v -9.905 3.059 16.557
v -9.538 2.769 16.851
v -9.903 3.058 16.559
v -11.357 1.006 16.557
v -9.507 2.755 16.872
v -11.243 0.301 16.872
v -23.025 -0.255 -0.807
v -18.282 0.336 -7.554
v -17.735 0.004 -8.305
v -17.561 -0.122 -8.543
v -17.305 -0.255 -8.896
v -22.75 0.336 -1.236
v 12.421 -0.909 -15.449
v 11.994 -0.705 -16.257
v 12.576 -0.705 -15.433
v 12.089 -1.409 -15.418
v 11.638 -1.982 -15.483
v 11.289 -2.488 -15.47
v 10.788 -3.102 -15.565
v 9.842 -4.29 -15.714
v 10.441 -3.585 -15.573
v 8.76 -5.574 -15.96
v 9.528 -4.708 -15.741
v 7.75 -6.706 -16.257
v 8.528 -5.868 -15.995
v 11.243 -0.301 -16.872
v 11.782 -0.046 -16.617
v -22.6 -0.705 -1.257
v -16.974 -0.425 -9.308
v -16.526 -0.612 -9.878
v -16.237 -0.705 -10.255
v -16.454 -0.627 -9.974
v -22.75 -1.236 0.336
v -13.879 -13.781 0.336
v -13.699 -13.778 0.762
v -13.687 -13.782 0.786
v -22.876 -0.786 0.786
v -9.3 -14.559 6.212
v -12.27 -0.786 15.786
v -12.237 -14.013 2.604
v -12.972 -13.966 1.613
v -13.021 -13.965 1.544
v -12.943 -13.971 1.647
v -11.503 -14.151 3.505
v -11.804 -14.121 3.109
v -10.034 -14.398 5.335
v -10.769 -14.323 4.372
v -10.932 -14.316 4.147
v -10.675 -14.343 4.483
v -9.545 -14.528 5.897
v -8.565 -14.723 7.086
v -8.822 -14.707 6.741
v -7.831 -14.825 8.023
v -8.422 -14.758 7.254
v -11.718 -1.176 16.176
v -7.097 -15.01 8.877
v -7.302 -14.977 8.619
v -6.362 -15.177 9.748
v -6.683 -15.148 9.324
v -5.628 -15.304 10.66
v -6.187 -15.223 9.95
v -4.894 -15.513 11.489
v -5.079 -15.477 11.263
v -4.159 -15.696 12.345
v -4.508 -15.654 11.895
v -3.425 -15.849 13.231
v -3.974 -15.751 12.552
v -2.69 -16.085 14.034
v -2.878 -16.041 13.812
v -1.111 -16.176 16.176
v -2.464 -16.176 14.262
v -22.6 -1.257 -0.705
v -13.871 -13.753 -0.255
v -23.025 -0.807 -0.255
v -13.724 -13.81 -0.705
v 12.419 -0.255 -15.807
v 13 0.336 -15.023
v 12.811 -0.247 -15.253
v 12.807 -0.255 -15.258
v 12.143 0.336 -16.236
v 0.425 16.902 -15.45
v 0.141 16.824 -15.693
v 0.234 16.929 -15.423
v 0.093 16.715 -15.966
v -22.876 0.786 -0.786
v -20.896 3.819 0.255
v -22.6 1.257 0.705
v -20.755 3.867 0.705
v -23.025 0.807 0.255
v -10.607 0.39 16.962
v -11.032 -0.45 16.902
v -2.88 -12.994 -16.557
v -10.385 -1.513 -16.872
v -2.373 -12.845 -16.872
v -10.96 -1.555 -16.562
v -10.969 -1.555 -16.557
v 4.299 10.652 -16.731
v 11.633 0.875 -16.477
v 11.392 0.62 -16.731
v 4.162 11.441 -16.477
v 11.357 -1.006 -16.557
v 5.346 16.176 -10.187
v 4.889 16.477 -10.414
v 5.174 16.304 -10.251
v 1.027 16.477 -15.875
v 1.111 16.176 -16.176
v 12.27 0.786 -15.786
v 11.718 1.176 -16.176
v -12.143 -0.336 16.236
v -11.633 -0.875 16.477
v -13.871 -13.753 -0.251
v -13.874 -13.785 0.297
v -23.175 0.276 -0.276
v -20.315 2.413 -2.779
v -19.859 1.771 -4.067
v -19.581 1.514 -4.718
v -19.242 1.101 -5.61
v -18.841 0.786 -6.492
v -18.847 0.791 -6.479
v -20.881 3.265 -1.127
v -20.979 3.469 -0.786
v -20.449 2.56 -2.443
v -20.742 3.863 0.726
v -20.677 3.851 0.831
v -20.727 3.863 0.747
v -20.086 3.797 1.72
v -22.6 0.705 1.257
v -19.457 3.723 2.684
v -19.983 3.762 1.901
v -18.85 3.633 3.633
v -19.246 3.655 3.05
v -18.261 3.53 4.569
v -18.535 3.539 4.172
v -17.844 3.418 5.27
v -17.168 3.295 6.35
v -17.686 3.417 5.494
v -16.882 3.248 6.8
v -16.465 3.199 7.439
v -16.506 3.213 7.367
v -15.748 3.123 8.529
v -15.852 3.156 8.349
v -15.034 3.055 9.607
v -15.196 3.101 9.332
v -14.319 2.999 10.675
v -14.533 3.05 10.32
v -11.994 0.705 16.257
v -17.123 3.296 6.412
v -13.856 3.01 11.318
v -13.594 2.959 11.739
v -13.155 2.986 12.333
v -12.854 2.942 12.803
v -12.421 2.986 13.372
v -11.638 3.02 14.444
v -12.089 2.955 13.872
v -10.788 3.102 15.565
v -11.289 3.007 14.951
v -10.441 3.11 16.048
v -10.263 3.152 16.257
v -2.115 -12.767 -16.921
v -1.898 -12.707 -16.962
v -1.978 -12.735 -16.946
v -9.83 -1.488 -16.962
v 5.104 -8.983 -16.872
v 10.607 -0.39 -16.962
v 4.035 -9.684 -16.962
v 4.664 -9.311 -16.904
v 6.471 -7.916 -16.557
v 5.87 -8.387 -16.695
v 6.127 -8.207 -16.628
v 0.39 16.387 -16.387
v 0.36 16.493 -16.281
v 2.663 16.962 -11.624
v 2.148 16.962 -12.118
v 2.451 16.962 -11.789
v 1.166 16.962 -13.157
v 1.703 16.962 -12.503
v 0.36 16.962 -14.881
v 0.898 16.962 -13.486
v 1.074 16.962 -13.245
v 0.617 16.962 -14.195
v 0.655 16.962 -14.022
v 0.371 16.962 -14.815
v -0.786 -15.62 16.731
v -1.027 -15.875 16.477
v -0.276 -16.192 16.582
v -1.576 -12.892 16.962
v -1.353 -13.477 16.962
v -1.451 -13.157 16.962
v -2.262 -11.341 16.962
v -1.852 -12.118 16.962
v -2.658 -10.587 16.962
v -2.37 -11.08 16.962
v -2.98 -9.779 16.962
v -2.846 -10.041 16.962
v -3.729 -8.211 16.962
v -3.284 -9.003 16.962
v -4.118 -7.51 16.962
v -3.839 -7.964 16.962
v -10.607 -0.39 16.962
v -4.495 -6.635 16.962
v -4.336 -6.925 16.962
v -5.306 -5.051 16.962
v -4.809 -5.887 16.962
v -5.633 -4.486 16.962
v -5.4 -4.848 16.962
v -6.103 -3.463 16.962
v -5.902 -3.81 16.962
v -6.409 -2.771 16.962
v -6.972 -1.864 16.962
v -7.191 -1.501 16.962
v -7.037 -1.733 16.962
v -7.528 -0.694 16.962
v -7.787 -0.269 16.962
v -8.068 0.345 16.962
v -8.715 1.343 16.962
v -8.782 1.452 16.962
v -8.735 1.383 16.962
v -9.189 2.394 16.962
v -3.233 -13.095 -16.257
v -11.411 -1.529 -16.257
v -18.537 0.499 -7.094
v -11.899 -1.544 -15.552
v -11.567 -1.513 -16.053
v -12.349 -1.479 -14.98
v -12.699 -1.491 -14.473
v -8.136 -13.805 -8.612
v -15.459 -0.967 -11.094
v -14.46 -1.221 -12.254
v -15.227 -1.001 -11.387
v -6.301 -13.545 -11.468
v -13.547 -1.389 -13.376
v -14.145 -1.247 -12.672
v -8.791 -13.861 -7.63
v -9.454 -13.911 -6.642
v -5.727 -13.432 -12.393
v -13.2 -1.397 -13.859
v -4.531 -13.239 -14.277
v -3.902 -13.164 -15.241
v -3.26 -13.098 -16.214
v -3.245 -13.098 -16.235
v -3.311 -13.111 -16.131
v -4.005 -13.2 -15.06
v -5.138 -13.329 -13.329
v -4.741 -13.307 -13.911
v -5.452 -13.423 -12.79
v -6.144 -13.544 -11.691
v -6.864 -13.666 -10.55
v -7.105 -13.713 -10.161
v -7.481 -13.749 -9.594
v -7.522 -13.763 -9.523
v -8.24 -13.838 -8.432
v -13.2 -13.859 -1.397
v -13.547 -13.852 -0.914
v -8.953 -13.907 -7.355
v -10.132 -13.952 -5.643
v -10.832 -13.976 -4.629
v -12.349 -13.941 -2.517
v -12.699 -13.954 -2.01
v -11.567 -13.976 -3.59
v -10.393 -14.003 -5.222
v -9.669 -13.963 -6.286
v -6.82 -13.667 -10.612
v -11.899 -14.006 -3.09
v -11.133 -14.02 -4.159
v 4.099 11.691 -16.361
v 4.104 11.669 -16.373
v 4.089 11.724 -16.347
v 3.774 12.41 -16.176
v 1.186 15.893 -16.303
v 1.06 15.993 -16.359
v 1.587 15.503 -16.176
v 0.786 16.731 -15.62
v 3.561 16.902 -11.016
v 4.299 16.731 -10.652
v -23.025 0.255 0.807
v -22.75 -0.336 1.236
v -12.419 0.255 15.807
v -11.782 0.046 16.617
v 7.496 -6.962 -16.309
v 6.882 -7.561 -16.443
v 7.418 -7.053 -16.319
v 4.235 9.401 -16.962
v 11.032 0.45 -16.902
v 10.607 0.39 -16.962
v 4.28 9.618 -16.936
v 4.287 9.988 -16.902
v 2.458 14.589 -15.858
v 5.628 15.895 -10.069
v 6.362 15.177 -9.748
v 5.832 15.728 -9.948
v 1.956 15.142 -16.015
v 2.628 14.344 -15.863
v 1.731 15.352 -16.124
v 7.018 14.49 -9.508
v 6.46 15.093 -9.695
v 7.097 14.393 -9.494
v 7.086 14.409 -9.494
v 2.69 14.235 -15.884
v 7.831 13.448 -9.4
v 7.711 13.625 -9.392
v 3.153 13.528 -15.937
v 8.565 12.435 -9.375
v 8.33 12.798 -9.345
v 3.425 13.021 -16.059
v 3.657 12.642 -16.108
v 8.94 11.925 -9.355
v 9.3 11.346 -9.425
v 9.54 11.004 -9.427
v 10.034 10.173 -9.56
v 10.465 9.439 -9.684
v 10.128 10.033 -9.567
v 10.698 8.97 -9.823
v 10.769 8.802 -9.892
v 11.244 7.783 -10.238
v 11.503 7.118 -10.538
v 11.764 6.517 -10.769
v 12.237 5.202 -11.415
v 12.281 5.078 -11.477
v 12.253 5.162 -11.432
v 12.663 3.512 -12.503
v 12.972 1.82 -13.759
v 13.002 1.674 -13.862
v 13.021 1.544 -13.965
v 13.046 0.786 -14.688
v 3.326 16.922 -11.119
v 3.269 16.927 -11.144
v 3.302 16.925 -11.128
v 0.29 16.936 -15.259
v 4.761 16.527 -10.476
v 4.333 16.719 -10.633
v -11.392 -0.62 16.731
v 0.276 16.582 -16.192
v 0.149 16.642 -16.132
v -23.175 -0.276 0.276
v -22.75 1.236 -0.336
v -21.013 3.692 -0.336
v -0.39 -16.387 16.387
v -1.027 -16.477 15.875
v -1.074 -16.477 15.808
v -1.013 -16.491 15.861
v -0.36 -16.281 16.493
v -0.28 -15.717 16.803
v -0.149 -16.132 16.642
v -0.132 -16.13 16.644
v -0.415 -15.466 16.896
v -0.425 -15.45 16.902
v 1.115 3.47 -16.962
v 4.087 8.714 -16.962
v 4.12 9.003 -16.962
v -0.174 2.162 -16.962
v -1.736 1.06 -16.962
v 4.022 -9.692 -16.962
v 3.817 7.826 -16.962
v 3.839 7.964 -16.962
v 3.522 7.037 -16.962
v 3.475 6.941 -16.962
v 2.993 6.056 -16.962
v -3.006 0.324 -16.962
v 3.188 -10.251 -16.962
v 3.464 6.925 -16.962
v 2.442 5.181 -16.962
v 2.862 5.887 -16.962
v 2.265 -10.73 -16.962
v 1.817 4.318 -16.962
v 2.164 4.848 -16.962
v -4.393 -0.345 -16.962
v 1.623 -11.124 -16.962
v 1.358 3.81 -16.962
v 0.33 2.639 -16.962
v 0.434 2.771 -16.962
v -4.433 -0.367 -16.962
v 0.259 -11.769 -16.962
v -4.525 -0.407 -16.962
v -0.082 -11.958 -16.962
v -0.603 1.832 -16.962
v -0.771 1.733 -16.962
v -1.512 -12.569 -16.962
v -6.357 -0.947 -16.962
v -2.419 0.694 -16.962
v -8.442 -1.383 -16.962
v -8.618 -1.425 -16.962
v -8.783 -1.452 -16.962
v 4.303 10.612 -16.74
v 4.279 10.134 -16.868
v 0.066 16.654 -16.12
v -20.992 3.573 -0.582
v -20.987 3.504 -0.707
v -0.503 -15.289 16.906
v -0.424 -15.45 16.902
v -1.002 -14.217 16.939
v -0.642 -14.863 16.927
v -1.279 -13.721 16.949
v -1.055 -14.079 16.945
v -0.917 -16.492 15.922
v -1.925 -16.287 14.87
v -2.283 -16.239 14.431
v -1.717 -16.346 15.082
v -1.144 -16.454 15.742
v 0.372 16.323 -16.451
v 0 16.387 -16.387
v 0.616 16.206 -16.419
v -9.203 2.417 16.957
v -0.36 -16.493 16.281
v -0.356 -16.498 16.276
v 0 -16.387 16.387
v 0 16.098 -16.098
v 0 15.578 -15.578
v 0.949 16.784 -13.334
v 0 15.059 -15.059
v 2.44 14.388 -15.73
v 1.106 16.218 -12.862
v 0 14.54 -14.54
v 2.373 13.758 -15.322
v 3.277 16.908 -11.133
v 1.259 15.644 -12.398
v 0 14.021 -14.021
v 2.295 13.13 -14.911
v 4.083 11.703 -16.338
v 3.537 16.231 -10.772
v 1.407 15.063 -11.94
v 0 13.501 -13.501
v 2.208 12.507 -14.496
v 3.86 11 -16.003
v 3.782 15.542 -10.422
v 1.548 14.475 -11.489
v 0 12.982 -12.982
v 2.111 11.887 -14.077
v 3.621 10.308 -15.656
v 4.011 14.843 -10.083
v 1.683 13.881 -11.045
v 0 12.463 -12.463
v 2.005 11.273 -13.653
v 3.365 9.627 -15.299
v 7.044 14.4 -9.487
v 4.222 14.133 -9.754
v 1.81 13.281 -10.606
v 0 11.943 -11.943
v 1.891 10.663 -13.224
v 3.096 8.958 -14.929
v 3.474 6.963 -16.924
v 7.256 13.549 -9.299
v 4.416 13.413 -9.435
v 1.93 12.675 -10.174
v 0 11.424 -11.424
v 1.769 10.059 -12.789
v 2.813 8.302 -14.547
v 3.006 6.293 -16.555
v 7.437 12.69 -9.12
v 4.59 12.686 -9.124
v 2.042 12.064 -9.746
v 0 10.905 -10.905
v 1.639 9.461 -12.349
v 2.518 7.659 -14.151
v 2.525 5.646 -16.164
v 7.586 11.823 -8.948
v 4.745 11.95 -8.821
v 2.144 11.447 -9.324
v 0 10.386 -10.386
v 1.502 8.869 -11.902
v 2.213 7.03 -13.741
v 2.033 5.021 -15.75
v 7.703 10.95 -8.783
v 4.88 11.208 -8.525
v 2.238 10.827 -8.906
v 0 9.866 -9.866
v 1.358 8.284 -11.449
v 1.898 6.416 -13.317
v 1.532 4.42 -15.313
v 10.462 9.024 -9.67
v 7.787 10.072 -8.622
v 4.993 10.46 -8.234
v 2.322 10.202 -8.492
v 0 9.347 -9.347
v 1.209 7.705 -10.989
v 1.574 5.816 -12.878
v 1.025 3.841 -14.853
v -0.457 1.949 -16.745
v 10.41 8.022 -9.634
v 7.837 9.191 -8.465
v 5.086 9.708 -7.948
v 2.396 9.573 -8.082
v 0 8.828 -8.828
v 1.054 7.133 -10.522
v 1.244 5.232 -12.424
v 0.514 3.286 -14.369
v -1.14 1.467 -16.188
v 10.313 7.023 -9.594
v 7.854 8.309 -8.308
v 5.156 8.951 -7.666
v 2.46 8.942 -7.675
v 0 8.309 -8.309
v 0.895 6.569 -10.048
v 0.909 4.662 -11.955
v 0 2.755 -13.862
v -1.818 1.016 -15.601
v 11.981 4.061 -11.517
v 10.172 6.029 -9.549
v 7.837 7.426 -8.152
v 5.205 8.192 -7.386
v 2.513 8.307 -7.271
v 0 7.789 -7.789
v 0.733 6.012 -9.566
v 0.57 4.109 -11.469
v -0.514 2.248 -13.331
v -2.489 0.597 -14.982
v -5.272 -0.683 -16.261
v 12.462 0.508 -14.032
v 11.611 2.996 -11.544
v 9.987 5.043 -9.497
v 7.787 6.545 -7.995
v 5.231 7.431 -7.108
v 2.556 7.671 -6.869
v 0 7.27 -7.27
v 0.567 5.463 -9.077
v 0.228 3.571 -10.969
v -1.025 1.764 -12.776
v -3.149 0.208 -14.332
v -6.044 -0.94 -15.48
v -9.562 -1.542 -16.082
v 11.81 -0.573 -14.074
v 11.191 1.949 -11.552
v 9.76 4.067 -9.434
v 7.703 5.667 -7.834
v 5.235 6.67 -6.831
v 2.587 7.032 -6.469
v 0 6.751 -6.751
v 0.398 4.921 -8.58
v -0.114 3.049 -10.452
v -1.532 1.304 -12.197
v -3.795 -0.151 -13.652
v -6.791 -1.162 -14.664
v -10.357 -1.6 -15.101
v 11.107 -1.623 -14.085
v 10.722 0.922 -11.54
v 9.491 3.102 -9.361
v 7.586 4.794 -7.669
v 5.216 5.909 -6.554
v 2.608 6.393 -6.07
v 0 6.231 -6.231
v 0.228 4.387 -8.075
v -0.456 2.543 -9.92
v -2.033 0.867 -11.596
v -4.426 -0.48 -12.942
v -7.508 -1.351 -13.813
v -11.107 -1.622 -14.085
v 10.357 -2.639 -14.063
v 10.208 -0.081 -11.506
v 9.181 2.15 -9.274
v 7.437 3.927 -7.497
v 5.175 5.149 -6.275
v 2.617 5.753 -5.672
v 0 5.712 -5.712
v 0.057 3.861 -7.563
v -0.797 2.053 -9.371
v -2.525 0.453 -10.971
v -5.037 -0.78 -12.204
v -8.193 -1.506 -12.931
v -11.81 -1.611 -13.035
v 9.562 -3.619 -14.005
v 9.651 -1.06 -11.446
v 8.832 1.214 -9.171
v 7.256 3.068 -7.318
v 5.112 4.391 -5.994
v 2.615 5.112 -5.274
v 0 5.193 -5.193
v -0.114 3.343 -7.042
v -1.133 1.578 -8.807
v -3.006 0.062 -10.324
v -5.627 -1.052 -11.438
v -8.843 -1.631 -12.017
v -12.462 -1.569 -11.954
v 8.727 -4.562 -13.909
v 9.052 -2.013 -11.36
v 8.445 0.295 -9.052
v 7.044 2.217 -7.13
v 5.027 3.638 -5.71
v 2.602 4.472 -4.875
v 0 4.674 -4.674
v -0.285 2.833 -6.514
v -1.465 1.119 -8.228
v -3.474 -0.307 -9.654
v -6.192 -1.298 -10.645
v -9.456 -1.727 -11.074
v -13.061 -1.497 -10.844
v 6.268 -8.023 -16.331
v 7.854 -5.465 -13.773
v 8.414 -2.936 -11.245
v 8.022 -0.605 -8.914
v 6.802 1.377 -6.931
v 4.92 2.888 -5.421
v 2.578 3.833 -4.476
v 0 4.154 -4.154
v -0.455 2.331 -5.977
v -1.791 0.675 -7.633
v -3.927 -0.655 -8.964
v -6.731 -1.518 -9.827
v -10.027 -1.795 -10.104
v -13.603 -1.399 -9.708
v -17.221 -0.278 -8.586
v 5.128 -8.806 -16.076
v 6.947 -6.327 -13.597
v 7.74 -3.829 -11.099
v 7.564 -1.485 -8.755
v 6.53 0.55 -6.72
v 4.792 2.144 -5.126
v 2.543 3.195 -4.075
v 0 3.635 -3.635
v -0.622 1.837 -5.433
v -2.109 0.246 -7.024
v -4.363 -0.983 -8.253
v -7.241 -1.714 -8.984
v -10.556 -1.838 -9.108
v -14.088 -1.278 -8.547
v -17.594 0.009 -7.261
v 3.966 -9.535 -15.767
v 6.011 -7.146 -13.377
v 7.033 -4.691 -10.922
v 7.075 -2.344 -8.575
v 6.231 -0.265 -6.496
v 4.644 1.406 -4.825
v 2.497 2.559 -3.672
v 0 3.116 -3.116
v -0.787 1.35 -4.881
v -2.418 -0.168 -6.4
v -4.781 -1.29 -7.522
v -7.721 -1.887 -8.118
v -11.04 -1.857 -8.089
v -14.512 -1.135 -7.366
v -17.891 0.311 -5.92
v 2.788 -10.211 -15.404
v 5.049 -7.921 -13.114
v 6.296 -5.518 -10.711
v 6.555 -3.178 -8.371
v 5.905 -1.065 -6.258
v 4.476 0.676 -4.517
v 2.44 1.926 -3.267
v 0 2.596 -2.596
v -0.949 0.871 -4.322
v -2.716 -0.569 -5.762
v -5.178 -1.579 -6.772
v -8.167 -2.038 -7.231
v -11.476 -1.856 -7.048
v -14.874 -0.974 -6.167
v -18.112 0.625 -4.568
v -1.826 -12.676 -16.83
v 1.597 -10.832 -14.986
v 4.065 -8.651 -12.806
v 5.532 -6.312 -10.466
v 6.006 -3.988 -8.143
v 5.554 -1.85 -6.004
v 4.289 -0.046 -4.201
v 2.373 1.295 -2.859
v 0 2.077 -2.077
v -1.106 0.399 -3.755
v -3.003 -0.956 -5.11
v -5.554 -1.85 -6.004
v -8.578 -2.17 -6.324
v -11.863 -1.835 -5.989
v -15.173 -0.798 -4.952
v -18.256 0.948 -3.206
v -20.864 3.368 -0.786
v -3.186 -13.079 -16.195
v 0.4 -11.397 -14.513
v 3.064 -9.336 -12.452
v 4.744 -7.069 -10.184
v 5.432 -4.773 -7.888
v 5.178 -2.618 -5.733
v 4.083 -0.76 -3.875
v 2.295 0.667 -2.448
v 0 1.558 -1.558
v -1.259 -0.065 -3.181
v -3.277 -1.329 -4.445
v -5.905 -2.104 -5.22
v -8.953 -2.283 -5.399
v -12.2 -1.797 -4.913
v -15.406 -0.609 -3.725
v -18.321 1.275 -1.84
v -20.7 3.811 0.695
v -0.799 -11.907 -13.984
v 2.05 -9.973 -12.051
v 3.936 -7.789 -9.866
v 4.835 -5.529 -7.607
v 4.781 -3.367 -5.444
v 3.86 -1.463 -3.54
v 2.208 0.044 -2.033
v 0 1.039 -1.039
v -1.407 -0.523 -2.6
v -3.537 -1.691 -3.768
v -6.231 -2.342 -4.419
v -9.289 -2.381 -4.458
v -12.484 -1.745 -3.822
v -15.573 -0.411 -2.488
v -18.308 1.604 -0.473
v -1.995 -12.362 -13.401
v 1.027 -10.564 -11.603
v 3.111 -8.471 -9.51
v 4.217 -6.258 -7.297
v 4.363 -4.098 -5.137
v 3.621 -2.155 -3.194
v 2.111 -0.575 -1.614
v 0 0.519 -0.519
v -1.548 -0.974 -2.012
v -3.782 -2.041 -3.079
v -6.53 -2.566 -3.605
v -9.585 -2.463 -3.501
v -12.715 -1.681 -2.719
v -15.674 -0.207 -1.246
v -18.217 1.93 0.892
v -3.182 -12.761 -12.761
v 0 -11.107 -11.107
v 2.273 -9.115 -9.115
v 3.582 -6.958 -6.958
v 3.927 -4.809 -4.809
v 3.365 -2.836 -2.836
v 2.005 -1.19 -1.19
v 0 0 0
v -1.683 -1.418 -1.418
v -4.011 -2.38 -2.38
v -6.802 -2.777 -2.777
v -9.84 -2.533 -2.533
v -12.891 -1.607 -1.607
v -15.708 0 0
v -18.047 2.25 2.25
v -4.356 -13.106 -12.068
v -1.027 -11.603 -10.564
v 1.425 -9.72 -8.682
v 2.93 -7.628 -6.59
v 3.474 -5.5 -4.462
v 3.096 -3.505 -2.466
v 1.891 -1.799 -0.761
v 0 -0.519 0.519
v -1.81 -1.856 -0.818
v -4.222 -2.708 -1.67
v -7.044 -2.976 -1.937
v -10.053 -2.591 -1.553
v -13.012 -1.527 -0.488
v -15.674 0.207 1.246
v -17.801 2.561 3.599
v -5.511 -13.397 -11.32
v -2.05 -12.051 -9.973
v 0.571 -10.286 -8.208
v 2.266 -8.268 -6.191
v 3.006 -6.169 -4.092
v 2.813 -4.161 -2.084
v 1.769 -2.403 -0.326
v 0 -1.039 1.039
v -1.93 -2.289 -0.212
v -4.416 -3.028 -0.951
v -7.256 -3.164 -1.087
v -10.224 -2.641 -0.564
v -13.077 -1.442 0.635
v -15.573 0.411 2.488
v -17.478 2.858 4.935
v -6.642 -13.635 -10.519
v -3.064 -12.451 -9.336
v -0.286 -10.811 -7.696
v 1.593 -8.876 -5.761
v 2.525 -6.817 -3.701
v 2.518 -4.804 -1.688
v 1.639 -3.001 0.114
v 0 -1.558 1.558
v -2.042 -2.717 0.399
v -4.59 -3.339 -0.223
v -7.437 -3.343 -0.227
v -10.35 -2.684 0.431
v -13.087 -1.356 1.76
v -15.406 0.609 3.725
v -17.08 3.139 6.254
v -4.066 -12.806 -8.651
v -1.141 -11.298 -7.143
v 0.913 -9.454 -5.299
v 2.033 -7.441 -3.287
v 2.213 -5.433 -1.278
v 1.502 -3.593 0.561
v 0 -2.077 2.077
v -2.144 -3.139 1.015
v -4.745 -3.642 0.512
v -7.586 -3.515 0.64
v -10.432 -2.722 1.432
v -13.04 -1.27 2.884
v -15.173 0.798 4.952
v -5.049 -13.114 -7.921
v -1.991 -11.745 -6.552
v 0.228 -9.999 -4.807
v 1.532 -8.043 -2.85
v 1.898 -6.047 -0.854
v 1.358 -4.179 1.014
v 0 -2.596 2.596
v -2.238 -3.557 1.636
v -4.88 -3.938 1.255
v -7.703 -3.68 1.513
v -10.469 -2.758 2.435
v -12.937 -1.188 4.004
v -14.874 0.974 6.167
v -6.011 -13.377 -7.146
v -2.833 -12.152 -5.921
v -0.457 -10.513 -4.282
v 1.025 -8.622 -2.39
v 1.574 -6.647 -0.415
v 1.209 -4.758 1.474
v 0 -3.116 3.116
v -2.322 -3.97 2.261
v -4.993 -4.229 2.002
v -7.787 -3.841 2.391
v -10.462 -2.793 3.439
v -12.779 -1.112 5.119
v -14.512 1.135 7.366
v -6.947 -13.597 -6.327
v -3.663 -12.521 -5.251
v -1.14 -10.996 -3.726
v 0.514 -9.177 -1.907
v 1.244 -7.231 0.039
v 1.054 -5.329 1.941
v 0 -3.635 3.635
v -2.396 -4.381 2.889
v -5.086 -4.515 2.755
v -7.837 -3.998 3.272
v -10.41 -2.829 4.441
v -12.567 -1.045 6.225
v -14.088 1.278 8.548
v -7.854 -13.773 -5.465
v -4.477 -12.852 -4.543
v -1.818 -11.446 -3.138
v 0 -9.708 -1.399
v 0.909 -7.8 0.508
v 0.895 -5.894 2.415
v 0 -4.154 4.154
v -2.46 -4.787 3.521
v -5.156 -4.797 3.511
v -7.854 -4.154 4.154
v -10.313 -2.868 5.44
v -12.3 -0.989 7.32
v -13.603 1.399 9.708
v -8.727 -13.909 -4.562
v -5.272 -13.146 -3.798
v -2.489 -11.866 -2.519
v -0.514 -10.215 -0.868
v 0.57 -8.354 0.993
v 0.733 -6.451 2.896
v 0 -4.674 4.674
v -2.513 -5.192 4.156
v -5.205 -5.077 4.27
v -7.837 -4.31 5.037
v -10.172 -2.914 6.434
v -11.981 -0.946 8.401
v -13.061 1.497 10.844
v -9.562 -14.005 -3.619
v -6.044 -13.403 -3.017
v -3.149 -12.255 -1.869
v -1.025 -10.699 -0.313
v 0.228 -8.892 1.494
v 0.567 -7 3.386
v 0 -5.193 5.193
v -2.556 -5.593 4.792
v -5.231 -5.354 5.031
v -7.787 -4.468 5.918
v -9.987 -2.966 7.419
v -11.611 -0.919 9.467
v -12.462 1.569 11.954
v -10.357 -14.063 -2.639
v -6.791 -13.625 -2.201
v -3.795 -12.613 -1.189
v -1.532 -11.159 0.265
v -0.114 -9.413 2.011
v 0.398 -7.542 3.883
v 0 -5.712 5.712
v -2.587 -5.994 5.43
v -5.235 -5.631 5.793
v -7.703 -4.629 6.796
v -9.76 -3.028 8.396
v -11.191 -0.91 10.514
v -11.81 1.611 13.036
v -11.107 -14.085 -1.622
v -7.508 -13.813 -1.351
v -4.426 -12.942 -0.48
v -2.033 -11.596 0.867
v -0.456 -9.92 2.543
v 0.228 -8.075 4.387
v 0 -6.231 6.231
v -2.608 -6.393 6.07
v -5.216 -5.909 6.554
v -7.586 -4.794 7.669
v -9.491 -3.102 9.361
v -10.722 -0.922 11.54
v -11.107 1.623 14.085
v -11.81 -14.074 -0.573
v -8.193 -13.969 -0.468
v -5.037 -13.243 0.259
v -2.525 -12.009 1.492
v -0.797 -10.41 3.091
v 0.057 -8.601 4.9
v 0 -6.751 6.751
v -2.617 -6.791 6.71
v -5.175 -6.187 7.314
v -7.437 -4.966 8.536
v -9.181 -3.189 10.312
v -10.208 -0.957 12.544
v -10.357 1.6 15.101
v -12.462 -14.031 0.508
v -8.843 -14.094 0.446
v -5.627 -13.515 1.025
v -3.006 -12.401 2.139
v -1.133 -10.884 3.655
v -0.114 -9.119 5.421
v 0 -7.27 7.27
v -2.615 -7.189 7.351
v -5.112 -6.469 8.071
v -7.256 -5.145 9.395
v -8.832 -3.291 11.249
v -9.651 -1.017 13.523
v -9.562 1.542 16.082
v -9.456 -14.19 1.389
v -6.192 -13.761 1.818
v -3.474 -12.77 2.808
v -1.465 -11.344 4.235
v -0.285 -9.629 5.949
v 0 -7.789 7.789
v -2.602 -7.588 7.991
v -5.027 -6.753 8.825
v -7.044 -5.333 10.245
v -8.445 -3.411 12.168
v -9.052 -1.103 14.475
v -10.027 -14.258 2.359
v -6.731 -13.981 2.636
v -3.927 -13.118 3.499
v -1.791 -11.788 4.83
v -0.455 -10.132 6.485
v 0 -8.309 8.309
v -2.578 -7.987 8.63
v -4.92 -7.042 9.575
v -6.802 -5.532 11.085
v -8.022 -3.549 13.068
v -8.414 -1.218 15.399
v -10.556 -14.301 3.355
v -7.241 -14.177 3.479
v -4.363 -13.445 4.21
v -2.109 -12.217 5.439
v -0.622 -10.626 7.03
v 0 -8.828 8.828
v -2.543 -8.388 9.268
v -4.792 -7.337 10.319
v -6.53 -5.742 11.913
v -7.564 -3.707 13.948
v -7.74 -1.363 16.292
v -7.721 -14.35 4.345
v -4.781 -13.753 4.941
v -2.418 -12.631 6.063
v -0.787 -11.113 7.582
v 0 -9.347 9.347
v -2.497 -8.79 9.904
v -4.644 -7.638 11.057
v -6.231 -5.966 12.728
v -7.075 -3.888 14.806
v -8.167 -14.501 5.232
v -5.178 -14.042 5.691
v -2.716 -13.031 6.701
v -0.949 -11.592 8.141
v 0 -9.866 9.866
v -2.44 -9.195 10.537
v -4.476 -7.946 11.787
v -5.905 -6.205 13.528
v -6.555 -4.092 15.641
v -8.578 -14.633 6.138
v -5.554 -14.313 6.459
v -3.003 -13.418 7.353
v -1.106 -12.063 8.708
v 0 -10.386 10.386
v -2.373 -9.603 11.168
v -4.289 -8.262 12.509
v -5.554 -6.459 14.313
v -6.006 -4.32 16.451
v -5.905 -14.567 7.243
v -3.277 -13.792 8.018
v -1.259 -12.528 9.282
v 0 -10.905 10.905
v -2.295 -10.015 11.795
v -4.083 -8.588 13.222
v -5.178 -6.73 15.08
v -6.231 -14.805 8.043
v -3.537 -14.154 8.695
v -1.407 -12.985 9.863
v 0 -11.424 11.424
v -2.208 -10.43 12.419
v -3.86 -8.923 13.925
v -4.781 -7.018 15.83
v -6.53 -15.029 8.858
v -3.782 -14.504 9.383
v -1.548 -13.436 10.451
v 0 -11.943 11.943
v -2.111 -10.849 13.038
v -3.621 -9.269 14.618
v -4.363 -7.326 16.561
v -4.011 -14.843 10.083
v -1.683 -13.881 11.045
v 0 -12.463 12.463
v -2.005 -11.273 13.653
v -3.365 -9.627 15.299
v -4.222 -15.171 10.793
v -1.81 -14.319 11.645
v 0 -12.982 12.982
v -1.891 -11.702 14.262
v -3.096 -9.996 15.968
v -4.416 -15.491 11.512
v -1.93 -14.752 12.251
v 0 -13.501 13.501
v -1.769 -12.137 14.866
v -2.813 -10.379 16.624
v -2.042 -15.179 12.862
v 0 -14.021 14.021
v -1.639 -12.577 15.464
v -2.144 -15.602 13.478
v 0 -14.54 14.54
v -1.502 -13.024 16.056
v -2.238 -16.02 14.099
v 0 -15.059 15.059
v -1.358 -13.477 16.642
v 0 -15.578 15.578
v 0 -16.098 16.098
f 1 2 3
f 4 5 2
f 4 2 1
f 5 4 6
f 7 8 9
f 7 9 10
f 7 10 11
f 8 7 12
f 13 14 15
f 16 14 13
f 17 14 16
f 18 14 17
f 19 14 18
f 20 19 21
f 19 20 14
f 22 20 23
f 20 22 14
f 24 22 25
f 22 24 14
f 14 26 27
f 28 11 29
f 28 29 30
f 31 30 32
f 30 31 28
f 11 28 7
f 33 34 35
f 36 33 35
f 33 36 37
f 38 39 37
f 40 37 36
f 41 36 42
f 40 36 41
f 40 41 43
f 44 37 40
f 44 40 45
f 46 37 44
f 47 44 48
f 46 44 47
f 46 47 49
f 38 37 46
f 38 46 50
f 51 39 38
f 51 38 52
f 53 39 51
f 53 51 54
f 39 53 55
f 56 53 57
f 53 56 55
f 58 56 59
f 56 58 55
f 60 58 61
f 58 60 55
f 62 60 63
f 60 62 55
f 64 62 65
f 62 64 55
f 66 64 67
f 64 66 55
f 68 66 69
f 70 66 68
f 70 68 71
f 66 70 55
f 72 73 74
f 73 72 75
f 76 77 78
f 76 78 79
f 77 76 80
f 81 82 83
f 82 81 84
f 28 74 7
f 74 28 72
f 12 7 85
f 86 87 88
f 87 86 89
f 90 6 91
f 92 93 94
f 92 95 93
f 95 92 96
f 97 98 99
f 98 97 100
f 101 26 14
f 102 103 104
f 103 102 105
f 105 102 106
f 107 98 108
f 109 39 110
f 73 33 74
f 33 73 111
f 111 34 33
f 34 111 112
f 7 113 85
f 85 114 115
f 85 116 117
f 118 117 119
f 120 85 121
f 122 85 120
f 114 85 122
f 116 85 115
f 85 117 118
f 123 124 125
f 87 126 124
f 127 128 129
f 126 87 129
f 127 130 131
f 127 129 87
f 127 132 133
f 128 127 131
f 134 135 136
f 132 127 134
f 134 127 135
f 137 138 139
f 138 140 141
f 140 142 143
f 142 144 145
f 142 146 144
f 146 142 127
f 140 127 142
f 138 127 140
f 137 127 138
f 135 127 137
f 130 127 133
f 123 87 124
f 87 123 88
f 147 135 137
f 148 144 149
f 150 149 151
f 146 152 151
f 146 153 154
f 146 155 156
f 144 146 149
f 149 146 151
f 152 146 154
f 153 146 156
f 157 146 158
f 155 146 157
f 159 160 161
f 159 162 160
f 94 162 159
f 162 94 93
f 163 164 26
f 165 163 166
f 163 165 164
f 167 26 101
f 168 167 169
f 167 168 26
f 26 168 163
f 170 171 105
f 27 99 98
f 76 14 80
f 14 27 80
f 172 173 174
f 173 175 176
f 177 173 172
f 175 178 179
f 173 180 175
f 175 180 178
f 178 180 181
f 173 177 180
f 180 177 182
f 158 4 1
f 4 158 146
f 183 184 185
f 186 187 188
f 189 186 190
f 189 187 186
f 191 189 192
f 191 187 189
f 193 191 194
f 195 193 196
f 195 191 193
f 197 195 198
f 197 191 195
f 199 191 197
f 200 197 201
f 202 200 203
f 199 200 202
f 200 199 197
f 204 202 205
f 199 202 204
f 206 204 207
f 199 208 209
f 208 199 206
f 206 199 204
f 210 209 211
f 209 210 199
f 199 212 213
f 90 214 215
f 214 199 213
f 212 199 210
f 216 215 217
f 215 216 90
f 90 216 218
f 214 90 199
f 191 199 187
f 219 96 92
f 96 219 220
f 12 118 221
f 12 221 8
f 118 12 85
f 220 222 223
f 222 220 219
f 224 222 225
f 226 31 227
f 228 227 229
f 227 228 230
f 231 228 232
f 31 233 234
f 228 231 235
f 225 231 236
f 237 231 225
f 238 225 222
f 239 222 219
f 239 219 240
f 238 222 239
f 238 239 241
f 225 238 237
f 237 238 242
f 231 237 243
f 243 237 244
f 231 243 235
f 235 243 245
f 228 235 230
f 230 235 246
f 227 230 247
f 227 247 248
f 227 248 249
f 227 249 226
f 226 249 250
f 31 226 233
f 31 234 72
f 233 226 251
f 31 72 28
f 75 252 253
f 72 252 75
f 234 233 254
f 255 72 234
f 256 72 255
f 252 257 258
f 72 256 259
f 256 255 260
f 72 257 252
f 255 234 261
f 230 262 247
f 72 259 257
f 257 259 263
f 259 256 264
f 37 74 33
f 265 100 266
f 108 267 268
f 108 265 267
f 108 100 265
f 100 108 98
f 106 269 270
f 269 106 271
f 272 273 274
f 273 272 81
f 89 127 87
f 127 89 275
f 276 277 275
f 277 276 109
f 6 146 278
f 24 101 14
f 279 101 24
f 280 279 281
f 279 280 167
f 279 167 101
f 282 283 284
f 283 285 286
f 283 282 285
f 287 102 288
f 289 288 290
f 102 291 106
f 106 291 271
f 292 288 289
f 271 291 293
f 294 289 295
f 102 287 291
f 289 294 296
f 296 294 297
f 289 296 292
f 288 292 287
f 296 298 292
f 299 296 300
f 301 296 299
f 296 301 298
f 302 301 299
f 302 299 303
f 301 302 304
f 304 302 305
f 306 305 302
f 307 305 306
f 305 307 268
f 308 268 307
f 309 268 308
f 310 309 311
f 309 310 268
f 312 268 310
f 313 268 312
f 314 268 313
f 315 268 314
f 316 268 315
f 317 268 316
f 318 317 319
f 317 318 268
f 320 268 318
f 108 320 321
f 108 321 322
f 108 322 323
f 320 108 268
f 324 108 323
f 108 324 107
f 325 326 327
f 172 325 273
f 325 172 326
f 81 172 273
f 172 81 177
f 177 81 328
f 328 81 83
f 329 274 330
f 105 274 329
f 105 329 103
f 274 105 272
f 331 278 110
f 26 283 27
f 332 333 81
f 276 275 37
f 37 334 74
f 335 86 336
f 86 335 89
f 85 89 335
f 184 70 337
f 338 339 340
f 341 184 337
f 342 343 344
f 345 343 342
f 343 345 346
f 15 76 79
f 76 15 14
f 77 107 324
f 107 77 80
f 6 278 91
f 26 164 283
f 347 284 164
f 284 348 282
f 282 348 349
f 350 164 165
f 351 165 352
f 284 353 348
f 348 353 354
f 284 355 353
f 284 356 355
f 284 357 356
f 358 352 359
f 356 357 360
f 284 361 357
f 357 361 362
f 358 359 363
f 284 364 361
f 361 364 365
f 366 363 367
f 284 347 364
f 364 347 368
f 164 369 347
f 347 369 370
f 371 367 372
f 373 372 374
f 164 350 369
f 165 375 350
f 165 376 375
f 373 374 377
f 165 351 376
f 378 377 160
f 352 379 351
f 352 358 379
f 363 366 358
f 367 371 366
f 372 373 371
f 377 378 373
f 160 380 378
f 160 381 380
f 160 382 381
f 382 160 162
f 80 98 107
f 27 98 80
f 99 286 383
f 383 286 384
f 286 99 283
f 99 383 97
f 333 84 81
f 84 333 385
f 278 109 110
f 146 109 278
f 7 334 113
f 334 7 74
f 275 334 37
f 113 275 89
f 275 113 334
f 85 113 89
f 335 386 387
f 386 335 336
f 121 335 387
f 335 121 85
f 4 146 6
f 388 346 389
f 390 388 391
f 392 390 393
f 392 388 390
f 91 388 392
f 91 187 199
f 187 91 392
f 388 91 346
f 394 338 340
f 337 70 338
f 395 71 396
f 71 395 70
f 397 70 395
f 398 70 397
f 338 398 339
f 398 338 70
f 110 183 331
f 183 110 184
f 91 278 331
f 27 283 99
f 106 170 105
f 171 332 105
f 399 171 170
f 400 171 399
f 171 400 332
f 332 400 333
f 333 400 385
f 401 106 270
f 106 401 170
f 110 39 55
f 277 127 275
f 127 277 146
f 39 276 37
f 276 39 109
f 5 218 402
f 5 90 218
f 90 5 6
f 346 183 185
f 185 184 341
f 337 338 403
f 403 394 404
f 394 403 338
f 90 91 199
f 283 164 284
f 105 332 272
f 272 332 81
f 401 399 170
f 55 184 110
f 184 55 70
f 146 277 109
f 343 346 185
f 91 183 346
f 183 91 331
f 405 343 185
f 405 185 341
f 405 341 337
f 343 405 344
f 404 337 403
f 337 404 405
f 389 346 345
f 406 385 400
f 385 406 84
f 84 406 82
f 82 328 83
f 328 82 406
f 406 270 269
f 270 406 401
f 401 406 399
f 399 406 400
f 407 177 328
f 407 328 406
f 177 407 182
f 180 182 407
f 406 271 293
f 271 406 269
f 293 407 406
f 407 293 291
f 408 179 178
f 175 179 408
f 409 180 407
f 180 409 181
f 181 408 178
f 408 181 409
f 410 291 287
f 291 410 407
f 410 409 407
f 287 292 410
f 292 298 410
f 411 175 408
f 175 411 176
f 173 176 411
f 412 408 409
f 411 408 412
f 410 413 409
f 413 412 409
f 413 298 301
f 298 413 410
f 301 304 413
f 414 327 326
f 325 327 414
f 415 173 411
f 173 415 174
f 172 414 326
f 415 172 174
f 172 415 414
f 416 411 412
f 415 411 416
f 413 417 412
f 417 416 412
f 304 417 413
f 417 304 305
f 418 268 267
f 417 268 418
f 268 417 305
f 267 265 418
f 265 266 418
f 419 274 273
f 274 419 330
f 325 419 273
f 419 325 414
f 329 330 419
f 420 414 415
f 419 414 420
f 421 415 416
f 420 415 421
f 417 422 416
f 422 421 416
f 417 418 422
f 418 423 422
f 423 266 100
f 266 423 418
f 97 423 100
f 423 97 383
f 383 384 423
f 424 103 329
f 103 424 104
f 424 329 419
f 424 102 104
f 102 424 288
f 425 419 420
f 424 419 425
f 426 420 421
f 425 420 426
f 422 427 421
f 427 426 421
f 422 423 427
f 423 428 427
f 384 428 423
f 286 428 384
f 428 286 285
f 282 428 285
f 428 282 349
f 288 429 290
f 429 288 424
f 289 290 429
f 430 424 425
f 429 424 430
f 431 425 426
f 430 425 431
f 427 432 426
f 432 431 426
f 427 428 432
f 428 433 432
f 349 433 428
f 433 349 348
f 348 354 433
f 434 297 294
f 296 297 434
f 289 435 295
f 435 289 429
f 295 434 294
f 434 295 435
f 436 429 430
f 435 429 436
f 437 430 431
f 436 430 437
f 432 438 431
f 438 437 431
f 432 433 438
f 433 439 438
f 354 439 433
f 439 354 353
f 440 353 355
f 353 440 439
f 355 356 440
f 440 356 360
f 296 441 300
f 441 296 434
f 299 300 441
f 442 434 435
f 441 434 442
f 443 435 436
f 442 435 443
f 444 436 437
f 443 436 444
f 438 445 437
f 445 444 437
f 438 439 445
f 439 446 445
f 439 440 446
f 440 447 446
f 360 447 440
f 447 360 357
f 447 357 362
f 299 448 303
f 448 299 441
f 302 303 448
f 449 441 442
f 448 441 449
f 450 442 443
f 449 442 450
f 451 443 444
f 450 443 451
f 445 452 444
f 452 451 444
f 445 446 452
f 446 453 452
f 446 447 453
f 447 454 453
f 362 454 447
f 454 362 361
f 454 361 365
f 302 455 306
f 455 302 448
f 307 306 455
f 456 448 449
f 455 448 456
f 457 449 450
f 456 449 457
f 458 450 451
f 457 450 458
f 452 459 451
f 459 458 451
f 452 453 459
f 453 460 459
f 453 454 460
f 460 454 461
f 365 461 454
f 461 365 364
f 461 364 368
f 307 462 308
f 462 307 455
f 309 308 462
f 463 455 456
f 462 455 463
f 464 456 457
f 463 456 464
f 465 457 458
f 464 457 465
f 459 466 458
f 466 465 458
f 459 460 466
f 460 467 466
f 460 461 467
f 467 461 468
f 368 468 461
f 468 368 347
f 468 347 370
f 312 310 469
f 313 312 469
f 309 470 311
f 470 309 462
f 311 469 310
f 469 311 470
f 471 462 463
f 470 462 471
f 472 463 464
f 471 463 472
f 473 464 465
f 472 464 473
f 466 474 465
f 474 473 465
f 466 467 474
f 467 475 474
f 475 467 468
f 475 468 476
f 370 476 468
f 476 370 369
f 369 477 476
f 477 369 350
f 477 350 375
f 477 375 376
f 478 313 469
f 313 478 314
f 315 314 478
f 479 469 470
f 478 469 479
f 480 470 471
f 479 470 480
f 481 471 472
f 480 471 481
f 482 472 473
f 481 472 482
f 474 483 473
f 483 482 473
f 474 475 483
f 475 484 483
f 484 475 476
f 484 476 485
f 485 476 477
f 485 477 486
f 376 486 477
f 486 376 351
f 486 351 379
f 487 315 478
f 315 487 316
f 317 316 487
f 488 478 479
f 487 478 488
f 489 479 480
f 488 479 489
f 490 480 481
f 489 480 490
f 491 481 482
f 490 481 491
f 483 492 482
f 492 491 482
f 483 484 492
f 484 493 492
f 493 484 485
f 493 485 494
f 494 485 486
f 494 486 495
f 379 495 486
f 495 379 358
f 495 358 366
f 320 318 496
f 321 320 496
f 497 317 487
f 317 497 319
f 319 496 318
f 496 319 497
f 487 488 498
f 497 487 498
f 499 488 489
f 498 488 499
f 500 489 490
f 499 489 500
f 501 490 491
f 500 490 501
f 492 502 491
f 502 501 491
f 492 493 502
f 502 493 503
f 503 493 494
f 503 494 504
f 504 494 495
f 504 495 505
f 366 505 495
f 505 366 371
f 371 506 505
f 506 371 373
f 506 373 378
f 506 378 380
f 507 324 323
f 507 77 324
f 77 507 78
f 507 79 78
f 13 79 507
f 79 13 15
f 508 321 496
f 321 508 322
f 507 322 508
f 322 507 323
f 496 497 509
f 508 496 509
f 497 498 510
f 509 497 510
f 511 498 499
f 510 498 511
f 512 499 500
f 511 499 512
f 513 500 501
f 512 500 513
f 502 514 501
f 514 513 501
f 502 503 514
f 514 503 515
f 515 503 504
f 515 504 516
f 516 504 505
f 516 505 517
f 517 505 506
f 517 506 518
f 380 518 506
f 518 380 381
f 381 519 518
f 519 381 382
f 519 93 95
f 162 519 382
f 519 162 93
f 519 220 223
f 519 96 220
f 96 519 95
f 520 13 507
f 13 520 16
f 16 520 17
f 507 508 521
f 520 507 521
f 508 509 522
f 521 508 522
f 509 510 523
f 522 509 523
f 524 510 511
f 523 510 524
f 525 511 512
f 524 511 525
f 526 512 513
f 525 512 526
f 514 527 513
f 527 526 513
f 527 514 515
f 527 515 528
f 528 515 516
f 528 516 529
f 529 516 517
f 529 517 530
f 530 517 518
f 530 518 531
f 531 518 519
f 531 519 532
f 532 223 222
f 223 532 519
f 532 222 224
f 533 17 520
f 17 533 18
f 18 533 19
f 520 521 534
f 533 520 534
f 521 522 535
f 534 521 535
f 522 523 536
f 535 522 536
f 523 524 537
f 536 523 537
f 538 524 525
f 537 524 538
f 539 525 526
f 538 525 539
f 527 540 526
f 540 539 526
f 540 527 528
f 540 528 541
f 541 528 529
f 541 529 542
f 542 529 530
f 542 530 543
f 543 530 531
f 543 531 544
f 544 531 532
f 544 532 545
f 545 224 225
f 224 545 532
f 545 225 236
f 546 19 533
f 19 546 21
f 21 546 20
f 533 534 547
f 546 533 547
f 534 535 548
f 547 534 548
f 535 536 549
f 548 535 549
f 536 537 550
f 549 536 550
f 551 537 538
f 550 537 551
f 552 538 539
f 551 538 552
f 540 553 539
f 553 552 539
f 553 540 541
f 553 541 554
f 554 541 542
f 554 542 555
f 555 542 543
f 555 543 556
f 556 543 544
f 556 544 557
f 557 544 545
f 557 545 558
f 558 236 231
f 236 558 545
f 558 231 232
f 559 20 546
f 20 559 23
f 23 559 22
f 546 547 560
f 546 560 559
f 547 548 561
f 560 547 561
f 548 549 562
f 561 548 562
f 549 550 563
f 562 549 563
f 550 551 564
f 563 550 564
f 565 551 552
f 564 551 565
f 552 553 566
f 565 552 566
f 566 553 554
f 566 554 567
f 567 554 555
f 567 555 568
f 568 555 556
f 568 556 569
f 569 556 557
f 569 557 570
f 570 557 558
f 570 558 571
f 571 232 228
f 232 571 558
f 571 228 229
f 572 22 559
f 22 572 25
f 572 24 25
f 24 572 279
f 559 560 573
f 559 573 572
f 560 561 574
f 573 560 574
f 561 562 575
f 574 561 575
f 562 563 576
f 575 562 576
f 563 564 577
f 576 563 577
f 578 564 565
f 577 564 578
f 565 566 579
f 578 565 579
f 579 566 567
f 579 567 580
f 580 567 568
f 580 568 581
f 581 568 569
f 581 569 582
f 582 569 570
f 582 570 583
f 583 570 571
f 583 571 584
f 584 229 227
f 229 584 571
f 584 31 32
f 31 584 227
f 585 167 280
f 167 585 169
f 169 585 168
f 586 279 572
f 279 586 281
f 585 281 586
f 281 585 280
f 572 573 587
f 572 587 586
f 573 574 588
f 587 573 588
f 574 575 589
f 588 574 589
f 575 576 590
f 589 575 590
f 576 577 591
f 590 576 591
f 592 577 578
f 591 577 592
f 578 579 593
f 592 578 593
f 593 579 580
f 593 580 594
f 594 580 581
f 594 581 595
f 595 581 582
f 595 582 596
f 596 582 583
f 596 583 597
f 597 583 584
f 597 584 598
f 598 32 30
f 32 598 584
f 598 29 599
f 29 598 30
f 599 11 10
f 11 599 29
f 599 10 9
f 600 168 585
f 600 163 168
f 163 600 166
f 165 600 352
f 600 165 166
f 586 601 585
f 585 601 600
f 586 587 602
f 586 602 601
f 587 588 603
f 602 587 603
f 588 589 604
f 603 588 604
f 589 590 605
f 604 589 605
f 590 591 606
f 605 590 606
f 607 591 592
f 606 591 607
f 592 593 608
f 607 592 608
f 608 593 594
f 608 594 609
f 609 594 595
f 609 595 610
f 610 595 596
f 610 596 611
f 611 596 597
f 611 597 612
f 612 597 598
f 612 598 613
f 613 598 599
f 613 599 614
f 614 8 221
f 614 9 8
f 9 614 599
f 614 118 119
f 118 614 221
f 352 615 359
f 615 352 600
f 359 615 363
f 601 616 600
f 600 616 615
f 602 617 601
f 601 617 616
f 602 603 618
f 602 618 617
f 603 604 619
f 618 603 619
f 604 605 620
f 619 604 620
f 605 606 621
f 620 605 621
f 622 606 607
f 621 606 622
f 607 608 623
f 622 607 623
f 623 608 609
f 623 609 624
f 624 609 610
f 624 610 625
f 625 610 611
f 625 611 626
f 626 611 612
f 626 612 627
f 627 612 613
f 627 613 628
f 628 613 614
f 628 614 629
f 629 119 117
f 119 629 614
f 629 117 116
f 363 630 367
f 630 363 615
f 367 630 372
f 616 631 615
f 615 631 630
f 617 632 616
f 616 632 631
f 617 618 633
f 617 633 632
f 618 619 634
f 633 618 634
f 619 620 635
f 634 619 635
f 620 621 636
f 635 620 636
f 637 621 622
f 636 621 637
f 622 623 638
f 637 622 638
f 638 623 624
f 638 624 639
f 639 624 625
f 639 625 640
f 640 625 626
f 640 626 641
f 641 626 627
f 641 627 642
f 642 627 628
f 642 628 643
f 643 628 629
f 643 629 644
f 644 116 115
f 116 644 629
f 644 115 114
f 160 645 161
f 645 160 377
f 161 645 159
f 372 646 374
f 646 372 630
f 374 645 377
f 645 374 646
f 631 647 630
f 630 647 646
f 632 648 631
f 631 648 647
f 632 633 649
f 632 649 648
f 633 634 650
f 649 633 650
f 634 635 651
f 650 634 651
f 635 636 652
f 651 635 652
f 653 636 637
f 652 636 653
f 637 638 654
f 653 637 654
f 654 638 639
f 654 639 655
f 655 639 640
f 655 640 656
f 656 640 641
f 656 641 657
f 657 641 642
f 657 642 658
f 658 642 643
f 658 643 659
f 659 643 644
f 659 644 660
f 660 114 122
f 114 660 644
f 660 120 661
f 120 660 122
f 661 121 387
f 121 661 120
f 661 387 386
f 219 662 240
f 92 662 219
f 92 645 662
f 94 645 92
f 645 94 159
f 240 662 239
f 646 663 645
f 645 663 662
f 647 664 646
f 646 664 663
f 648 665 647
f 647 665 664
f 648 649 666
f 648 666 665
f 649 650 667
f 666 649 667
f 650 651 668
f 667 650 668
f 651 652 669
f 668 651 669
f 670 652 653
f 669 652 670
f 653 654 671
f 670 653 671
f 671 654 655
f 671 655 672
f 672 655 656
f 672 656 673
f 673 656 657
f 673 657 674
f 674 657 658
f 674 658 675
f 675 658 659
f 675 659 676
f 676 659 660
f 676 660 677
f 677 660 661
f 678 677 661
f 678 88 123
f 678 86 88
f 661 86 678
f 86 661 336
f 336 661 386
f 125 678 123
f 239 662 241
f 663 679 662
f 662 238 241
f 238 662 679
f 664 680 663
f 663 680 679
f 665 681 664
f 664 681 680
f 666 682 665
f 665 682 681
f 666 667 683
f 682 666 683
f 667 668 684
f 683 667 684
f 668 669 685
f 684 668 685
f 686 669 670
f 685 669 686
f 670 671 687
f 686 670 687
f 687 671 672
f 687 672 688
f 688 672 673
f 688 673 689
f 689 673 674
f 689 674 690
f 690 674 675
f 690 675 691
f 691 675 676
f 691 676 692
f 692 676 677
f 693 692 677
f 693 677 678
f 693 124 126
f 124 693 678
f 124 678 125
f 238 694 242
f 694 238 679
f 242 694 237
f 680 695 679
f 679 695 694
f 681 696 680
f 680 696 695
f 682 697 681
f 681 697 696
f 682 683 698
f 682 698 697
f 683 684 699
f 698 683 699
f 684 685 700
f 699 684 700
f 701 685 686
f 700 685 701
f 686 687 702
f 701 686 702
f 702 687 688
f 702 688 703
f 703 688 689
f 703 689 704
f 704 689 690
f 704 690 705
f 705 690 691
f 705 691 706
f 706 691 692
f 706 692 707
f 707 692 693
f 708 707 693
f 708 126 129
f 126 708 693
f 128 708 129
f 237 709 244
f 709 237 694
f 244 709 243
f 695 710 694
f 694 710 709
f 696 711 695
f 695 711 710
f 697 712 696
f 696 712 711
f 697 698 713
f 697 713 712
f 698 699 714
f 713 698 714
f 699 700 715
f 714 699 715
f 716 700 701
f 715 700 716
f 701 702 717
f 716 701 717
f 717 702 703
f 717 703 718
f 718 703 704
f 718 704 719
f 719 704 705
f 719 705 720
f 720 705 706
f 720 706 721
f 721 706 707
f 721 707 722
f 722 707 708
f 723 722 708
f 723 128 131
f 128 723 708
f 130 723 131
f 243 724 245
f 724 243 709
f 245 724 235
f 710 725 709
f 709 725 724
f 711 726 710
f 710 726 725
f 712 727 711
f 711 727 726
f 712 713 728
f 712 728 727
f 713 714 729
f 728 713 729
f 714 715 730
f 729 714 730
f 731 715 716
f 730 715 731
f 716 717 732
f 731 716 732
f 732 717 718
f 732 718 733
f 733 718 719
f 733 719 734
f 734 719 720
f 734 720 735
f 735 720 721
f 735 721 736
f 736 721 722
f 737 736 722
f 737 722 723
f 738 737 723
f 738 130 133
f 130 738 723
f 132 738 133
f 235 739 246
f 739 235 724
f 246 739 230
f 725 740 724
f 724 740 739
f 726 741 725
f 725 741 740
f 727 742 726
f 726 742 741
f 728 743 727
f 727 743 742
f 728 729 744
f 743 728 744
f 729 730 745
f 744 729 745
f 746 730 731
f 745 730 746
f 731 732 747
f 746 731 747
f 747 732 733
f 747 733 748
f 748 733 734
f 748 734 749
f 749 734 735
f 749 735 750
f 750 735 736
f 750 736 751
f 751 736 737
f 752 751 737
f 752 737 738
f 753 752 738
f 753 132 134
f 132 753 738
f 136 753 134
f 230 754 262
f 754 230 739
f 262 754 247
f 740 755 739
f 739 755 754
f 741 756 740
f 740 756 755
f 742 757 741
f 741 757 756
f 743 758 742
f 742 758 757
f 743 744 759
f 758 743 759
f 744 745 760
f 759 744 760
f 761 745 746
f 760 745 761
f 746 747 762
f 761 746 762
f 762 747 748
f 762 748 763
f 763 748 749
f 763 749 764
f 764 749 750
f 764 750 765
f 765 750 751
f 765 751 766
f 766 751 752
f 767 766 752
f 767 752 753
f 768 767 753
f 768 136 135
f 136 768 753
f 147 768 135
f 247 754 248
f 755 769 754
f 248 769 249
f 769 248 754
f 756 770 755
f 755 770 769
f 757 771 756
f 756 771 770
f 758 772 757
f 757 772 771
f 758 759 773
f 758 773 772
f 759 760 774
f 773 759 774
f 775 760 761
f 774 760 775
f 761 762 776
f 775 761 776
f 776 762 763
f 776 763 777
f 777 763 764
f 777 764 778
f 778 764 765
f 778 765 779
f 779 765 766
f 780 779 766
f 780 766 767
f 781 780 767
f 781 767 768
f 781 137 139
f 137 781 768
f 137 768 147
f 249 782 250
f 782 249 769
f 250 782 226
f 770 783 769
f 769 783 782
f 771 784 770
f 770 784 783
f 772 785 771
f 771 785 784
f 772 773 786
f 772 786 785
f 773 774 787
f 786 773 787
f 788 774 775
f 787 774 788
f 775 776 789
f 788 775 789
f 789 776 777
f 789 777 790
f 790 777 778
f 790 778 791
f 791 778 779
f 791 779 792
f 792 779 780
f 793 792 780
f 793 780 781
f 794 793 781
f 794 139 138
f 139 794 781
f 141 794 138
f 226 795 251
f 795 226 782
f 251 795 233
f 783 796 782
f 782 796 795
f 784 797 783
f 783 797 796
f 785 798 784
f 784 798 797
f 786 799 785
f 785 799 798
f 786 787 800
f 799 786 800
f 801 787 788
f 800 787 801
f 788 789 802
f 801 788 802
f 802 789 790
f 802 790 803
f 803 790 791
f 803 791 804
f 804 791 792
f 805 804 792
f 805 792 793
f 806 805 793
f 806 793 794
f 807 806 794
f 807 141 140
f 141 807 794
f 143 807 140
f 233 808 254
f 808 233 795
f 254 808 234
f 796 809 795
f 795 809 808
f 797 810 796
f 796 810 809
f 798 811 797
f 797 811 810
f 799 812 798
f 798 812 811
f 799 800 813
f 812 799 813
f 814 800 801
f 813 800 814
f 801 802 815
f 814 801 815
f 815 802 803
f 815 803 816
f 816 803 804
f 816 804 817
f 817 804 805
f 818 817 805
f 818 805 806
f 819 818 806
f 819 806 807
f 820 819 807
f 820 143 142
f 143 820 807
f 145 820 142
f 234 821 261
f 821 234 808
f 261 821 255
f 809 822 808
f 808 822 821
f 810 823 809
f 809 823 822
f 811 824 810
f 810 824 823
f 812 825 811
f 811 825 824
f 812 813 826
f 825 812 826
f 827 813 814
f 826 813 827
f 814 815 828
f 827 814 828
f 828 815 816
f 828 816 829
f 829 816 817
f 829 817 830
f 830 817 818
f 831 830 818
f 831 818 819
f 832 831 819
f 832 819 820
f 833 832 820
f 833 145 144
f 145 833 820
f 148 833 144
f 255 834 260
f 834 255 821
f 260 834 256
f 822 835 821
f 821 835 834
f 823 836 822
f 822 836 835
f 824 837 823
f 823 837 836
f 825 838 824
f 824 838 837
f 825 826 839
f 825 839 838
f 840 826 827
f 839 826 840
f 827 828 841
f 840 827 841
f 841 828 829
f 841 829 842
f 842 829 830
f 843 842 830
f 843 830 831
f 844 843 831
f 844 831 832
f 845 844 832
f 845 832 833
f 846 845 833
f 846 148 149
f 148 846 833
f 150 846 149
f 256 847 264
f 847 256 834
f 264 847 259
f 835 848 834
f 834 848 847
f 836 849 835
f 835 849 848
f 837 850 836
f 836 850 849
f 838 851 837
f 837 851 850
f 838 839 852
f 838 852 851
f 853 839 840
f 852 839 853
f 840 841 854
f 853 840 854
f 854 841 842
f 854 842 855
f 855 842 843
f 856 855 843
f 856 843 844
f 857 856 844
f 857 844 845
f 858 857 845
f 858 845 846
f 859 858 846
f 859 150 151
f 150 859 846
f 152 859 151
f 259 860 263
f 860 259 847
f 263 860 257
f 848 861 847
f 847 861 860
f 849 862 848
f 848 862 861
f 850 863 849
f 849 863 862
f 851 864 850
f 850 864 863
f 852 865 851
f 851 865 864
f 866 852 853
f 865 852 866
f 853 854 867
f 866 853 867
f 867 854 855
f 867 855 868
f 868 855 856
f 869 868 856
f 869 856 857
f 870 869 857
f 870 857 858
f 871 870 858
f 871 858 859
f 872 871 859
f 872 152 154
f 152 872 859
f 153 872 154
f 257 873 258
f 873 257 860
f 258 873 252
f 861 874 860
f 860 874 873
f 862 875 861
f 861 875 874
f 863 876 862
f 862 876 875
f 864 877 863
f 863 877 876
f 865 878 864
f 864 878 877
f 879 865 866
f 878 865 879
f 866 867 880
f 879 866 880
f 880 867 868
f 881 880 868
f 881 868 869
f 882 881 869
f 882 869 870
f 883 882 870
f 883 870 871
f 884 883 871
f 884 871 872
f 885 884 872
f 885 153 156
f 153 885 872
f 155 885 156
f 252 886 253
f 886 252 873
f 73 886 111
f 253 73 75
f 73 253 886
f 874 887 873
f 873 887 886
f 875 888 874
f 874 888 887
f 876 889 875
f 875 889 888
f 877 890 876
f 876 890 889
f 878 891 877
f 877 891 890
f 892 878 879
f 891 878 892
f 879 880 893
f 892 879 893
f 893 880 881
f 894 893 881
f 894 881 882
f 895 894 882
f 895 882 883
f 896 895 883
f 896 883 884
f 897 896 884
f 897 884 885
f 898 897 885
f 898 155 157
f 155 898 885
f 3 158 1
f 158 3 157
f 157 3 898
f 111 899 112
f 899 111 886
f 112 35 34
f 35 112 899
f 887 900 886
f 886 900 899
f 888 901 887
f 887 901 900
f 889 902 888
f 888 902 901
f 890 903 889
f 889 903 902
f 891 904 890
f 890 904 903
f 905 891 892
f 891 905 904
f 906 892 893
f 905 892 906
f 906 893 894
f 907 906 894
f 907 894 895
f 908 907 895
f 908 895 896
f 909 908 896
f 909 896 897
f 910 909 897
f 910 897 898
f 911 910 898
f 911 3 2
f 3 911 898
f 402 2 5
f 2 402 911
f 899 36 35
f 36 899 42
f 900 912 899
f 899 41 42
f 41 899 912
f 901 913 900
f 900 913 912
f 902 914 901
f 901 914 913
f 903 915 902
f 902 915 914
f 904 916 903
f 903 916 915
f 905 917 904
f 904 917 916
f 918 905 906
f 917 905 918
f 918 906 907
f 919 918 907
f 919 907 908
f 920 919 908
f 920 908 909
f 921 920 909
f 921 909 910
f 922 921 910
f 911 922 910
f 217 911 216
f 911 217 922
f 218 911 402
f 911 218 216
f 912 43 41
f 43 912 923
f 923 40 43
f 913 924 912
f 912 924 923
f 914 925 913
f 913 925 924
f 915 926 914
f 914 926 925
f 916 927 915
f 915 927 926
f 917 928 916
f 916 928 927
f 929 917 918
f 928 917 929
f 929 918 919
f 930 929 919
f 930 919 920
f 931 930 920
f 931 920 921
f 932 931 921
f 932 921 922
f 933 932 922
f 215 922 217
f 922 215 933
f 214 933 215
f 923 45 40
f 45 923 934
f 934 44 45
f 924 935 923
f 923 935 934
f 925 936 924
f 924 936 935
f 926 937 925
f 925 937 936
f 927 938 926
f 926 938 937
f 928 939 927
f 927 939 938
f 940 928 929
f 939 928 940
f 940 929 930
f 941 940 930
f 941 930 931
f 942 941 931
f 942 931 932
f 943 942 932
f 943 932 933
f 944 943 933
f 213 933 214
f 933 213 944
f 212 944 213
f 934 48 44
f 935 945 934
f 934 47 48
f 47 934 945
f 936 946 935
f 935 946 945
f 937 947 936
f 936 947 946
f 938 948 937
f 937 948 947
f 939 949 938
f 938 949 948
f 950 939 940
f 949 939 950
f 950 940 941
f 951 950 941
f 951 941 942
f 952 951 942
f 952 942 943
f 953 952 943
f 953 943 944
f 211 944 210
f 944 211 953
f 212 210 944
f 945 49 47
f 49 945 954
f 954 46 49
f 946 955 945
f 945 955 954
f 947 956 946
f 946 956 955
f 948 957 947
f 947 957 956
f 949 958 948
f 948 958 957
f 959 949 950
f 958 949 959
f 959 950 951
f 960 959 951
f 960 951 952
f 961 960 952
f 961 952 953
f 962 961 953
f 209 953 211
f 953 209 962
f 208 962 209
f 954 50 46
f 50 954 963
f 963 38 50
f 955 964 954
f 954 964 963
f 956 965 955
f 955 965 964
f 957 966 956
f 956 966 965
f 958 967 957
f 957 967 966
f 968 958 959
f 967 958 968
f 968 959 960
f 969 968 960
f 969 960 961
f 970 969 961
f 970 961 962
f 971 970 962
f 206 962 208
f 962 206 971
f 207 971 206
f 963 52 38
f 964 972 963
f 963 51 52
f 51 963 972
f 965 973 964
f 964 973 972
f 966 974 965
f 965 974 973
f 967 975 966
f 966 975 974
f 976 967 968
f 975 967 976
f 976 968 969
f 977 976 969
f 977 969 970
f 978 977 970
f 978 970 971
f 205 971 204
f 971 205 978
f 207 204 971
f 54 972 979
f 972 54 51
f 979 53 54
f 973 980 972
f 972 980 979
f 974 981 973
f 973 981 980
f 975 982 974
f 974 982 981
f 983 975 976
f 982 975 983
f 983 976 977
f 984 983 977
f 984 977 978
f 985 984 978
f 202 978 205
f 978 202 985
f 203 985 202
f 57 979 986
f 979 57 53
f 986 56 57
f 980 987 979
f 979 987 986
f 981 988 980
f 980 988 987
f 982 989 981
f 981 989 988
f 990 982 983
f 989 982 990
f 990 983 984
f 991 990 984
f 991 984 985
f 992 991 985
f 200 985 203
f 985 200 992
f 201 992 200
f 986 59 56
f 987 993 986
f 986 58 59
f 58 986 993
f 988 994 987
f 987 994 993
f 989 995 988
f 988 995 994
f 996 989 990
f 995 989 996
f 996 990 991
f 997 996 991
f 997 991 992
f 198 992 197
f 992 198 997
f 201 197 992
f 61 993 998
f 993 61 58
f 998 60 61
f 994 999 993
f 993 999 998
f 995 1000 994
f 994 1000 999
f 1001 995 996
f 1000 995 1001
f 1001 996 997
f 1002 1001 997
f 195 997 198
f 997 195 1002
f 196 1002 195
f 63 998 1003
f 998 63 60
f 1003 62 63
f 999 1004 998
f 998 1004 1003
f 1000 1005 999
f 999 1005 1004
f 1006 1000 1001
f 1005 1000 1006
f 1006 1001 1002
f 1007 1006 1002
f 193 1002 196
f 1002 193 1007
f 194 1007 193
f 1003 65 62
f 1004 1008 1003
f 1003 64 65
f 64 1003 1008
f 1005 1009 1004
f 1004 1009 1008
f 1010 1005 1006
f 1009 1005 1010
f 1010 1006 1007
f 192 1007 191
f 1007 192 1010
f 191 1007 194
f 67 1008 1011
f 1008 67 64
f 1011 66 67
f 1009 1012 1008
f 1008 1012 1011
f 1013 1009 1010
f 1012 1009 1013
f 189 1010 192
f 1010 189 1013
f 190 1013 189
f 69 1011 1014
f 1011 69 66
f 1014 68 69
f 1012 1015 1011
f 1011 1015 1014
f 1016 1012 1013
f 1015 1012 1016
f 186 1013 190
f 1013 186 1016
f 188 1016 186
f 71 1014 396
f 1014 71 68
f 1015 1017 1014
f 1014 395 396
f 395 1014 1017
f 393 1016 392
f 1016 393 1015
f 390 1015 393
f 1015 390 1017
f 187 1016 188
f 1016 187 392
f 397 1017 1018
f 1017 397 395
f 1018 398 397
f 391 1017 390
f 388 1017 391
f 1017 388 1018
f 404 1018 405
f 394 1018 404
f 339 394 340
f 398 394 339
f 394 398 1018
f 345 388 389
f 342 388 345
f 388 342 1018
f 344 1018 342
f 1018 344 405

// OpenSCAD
sz=30;
sa=sz*1.5;
tw = 240;
rounding=2;

 
/////////////////////////////////////////////////////////
// module for making a rhombic dodecahedron /////////////

// here VeryWetPaint has the elegant idea to contruct the 
// Rhombic Dodecahedron by intersecting six rectangular solids 

 module rhomb()
{
    minkowski()
    {
        // take six rectangular solids and intersect them
        intersection()
        {
            rotate([45,0,0])  cube(size=[sa,sz,sz],center=true );
            rotate([-45,0,0]) cube(size=[sa,sz,sz],center=true );

            rotate([0,45,0])  cube(size=[sz,sa,sz],center=true );
            rotate([0,-45,0]) cube(size=[sz,sa,sz],center=true );

            rotate([0,0,45])  cube(size=[sz,sz,sa],center=true );
            rotate([0,0,-45]) cube(size=[sz,sz,sa],center=true );
        }

        // this sphere rounds all of the edges with Minkowski sum
        sphere(r=rounding,$fn=16);
    }
}




module spiral()
{
    PI=3.14159265;
    // generate arc points with radius 20 using list comprehension syntax
    points = [ for (a = [0 : 10 : 270])  [ a*PI/180*sin(a), a*PI/180*cos(a) ] ];
    // use concat() to add one point in the center
    polygon(concat(points, [[0, 0]]));
}

module spiralQuarterCut()
{
    dia=sz/2;
    linear_extrude( height=sa+2, center=true, twist=tw, slices=64 )
    //difference()
    {
        //circle(r=sz);
        difference()
        {
            scale(dia) spiral();
            rotate([0,0,-90]) scale(dia) spiral();
        }
    }
}

// a rotate to make it sit flat
rotate([45,0,0])
//difference()
intersection()
{
    rhomb();
    spiralQuarterCut();
}
